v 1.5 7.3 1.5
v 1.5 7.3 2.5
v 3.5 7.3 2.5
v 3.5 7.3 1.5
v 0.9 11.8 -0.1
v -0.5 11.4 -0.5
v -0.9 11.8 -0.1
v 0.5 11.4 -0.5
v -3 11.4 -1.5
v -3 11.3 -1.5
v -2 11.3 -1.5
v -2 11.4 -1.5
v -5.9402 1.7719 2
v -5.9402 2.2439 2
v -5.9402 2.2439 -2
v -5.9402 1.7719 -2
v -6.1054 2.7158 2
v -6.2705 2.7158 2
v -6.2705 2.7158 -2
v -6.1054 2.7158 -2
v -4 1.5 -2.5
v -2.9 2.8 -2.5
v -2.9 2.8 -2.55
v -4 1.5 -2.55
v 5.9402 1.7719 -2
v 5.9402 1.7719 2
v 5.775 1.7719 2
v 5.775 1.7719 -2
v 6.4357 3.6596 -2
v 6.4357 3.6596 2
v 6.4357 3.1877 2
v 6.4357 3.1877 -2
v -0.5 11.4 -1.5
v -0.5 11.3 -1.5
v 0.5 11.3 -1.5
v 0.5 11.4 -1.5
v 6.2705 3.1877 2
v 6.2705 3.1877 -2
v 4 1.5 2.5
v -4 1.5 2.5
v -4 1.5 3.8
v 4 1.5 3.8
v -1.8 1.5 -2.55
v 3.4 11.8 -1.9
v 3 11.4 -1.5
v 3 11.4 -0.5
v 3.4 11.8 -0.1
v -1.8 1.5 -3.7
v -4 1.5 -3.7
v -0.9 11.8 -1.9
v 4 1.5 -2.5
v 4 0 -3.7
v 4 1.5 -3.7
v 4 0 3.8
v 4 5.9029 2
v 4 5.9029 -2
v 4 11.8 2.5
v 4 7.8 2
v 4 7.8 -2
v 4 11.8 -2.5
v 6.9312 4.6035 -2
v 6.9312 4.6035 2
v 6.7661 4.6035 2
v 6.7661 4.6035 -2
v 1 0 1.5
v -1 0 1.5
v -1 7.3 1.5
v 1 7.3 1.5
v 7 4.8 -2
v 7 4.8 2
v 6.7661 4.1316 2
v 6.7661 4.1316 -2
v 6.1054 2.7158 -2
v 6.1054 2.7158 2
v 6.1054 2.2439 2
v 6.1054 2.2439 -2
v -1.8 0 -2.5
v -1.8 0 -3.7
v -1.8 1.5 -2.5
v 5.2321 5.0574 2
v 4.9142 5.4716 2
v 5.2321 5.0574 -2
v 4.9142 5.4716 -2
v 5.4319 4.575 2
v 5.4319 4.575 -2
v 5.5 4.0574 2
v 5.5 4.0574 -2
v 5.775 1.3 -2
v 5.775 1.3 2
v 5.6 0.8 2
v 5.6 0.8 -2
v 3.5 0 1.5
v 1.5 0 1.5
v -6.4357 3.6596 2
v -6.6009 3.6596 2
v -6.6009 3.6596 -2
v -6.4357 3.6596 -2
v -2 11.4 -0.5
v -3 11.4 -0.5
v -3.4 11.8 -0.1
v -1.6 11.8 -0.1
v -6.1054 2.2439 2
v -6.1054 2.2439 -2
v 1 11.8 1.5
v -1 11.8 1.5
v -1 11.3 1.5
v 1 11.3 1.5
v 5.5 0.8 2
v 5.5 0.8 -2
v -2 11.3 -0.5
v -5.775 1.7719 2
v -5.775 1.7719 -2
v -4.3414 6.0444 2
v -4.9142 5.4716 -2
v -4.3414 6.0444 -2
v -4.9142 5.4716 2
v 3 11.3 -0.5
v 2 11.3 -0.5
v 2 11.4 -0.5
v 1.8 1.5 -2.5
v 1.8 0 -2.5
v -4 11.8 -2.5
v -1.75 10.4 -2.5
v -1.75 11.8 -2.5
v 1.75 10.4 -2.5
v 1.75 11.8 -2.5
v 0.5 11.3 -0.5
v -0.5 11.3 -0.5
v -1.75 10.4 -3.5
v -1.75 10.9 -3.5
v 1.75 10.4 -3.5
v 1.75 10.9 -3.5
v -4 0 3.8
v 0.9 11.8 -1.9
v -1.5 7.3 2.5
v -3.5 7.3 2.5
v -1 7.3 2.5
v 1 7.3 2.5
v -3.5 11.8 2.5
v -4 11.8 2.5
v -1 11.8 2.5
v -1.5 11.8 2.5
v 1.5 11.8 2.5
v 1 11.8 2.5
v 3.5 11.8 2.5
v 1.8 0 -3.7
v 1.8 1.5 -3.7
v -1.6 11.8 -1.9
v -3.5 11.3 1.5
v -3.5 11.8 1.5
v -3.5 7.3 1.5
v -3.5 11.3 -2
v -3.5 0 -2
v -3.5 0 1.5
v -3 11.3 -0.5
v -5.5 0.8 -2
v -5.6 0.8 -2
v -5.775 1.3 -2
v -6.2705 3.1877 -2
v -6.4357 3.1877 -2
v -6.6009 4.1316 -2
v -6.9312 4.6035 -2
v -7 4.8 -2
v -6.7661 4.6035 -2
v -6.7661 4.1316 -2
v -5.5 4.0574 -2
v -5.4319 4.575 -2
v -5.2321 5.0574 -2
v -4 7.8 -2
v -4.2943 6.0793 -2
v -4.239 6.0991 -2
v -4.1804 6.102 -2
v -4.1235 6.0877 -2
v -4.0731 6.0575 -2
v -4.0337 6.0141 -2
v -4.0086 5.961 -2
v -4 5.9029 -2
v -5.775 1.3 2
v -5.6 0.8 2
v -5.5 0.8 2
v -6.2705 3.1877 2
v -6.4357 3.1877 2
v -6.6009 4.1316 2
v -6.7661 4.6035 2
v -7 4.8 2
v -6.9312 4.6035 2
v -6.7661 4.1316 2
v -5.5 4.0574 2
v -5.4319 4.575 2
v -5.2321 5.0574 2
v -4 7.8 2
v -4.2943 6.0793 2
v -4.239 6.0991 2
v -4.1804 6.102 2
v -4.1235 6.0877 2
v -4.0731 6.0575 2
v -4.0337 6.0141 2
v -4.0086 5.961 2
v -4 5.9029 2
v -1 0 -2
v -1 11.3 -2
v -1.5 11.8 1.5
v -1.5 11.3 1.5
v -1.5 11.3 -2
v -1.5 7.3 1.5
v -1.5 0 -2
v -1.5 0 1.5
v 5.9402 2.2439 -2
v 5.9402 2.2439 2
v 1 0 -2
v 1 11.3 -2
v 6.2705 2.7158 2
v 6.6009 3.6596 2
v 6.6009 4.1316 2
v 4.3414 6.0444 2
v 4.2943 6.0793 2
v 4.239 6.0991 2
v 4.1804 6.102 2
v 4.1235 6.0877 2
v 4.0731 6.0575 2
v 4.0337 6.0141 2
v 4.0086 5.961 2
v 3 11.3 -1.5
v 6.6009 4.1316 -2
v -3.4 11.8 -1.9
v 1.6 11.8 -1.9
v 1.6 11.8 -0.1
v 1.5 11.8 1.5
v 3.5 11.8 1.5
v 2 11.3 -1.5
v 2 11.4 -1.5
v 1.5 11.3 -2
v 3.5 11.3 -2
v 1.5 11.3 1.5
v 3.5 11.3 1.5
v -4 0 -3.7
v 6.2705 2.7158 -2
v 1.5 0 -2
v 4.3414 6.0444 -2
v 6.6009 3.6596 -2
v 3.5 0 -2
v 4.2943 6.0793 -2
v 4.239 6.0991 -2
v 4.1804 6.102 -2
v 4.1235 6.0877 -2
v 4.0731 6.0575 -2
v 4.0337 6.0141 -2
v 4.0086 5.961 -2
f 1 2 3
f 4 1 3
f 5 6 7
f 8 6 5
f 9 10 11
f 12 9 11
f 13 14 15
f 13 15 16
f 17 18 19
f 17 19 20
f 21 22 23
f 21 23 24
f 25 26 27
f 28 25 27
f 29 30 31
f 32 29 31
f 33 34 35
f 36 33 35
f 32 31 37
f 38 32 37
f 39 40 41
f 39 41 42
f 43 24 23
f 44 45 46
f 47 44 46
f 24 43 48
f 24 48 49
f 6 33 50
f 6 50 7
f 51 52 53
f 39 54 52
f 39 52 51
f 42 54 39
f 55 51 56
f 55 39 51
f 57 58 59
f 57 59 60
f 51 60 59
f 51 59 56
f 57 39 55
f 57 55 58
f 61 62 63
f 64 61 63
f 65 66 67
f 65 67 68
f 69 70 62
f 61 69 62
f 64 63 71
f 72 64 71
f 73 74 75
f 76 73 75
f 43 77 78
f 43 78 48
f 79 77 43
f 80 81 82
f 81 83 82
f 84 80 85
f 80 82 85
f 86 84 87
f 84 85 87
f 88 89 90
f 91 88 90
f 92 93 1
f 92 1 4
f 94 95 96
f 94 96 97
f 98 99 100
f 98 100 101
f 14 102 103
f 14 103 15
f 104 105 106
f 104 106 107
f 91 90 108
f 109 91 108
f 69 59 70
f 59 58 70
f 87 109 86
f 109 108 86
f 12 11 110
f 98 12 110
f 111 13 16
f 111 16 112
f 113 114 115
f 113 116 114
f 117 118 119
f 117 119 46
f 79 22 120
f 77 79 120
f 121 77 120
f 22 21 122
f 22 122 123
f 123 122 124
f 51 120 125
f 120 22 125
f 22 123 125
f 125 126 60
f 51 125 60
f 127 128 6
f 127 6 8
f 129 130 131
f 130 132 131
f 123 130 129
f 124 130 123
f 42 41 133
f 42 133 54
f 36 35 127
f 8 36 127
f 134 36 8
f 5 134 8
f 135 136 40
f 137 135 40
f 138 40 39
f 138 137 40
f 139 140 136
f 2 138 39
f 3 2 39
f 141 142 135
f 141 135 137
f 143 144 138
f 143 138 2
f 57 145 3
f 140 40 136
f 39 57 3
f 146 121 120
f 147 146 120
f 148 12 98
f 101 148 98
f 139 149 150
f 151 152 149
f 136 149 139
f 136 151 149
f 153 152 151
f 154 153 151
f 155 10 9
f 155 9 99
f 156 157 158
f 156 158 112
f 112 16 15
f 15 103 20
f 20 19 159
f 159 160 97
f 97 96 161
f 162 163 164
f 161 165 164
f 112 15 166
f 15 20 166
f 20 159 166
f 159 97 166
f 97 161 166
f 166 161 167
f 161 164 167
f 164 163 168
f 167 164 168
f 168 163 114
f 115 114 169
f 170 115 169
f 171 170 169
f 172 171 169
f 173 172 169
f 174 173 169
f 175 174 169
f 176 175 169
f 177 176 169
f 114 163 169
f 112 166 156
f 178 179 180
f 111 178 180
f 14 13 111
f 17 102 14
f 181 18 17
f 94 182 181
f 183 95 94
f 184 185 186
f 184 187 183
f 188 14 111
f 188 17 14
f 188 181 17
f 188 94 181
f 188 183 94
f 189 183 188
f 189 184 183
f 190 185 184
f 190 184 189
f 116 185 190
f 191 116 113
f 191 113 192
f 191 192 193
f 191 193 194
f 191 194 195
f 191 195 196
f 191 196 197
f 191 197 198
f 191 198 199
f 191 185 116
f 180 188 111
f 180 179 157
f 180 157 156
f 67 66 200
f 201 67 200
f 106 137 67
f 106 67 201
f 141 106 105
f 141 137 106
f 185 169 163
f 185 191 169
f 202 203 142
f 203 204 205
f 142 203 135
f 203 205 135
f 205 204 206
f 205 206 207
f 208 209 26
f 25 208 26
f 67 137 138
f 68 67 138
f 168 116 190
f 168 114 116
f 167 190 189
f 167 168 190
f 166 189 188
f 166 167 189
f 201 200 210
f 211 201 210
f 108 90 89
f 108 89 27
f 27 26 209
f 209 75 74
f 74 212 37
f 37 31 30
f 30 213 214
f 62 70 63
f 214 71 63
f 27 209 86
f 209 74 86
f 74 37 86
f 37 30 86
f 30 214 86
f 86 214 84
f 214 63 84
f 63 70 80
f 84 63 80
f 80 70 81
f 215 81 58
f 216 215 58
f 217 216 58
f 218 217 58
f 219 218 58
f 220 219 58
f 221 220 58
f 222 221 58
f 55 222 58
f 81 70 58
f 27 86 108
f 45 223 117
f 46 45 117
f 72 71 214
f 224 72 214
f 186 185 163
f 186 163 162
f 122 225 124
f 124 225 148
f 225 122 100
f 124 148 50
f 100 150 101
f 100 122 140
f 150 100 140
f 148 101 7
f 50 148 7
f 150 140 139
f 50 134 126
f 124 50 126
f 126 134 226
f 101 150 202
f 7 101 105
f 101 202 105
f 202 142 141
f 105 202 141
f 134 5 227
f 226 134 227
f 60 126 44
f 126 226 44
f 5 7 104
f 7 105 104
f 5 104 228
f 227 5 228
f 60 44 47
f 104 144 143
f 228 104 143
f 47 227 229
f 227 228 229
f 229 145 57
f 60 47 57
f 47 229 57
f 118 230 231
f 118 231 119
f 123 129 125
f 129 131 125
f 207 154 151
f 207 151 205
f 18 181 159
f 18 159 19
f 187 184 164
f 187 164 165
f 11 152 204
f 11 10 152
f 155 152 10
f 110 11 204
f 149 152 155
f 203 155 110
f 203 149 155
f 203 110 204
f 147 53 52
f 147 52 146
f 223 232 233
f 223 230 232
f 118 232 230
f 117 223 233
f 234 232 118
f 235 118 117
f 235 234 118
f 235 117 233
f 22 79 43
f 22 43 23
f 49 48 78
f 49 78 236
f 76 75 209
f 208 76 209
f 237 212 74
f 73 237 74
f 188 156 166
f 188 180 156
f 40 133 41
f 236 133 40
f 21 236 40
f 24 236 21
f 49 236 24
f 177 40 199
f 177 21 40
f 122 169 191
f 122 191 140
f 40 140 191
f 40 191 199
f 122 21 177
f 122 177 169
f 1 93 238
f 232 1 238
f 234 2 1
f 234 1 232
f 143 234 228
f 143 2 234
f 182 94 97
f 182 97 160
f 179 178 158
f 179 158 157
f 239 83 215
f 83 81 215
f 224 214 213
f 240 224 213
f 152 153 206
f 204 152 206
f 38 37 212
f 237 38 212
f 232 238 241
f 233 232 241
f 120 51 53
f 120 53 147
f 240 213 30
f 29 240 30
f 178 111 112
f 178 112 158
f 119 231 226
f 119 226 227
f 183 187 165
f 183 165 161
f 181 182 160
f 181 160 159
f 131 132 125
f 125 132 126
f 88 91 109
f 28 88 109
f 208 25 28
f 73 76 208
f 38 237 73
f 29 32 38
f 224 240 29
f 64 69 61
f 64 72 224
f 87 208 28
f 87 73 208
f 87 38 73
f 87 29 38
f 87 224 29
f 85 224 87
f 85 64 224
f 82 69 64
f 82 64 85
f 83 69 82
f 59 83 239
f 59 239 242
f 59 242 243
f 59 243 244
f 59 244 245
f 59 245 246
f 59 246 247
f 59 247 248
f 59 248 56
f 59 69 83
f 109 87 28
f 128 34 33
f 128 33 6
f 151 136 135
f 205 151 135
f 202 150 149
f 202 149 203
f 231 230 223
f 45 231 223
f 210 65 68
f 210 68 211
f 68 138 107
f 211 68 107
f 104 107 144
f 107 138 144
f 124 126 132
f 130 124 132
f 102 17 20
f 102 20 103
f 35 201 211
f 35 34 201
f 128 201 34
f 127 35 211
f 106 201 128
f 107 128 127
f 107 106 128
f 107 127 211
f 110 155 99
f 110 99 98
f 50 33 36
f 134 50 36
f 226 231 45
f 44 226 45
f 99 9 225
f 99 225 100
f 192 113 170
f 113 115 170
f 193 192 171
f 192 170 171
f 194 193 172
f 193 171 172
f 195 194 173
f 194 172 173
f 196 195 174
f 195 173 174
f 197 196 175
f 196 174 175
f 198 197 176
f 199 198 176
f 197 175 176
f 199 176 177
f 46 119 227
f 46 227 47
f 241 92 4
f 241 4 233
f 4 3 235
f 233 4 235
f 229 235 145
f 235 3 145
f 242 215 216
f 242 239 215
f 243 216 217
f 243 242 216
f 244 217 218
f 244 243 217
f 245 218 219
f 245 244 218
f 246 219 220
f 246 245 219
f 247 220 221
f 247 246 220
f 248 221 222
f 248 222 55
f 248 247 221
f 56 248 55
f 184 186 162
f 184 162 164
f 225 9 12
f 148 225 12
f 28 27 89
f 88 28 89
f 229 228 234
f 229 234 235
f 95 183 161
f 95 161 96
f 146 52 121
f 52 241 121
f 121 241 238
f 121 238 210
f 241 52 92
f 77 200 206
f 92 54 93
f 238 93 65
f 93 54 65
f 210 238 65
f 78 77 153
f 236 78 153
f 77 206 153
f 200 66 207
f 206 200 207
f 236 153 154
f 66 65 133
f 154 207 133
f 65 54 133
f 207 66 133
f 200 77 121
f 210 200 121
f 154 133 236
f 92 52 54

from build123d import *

# Parameters (mm, degrees)
SKIZZE1_W                       = 8
SKIZZE1_H                       = 11.8
AUFSATZ_LINEAR_AUSTRAGEN1_DEPTH = 2.5
SKIZZE2_W                       = 8
SKIZZE2_H                       = 1.5
AUFSATZ_LINEAR_AUSTRAGEN2_DEPTH = 1.3
SKIZZE3_W                       = 2.2
SKIZZE3_H                       = 1.5
AUFSATZ_LINEAR_AUSTRAGEN3_DEPTH = 1.2
AUFSATZ_LINEAR_AUSTRAGEN4_DEPTH = 1.75
AUFSATZ_LINEAR_AUSTRAGEN5_DEPTH = 0.05
SKIZZE6_W                       = 2
SKIZZE6_H                       = 3.5
SCHNITT_LINEAR_AUSTRAGEN1_DEPTH = 11.3
SKIZZE7_W                       = 2
SKIZZE7_H                       = 4.5
SCHNITT_LINEAR_AUSTRAGEN2_DEPTH = 1
SKIZZE8_W                       = 1
SKIZZE8_H                       = 1
SCHNITT_LINEAR_AUSTRAGEN3_DEPTH = 13.574975149
FASE1_SIZE                      = 0.4
LINEARES_MUSTER1_COUNT          = 3
LINEARES_MUSTER1_PITCH          = 2.5
FASE1_OF_LINEARES_MUSTER1_SIZE  = 0.4
AUFSATZ_LINEAR_AUSTRAGEN6_DEPTH = 2
SCHNITT_LINEAR_AUSTRAGEN4_DEPTH = 2.5
LINEARES_MUSTER2_COUNT          = 7
LINEARES_MUSTER2_PITCH          = 0.5
VERRUNDUNG1_R                   = 2
VERRUNDUNG2_R                   = 0.2
SPIEGELN1_COPY_1_DEPTH          = 2.5
SPIEGELN1_COPY_2_DEPTH          = 2.5
SPIEGELN1_COPY_3_DEPTH          = 2.5
SPIEGELN1_COPY_4_DEPTH          = 2.5
SPIEGELN1_COPY_5_DEPTH          = 2.5
SPIEGELN1_COPY_6_DEPTH          = 2.5
VERRUNDUNG1_OF_SPIEGELN1_R      = 2
VERRUNDUNG2_OF_SPIEGELN1_R      = 0.2


with BuildPart() as part:
    # Skizze1 → Aufsatz-Linear austragen1 (new, symmetric)
    with BuildSketch(Plane.XY):
        with Locations((0, 5.9)):
            Rectangle(SKIZZE1_W, SKIZZE1_H)
    extrude(amount=AUFSATZ_LINEAR_AUSTRAGEN1_DEPTH, both=True)

    # Skizze2 → Aufsatz-Linear austragen2 (add)
    with BuildSketch(Plane.XY.offset(2.5)):
        with Locations((0, 0.75)):
            Rectangle(SKIZZE2_W, SKIZZE2_H)
    extrude(amount=AUFSATZ_LINEAR_AUSTRAGEN2_DEPTH)

    # Skizze3 → Aufsatz-Linear austragen3 (add)
    with BuildSketch(Plane(origin=(0, 0, -2.5), x_dir=(-1, 0, 0), z_dir=(0, 0, -1))):
        with Locations((-2.9, 0.75)):
            Rectangle(SKIZZE3_W, SKIZZE3_H)
        with Locations((2.9, 0.75)):
            Rectangle(SKIZZE3_W, SKIZZE3_H)
    extrude(amount=AUFSATZ_LINEAR_AUSTRAGEN3_DEPTH)

    # Skizze4 → Aufsatz-Linear austragen4 (add, symmetric)
    with BuildSketch(Plane(origin=(0, 0, 0), x_dir=(0, 0, -1), z_dir=(1, 0, 0))):
        Polygon((2.5, 11.8), (3.5, 10.9), (3.5, 10.4), (2.5, 10.4), align=None)
    extrude(amount=AUFSATZ_LINEAR_AUSTRAGEN4_DEPTH, both=True)

    # Skizze5 → Aufsatz-Linear austragen5 (add)
    with BuildSketch(Plane(origin=(0, 0, -2.5), x_dir=(-1, 0, 0), z_dir=(0, 0, -1))):
        Polygon((1.8, 1.5), (2.9, 2.8), (4, 1.5), align=None)
    extrude(amount=AUFSATZ_LINEAR_AUSTRAGEN5_DEPTH)

    # Skizze6 → Schnitt-Linear austragen1 (cut)
    with BuildSketch(Plane.XZ):
        with Locations((-2.5, -0.25)):
            Rectangle(SKIZZE6_W, SKIZZE6_H)
    schnitt_linear_austragen1 = extrude(amount=-SCHNITT_LINEAR_AUSTRAGEN1_DEPTH, mode=Mode.SUBTRACT)

    # Skizze7 → Schnitt-Linear austragen2 (cut)
    with BuildSketch(Plane.XY.offset(2.5)):
        with Locations((-2.5, 9.55)):
            Rectangle(SKIZZE7_W, SKIZZE7_H)
    schnitt_linear_austragen2 = extrude(amount=-SCHNITT_LINEAR_AUSTRAGEN2_DEPTH, mode=Mode.SUBTRACT)

    # Skizze8 → Schnitt-Linear austragen3 (cut, through all)
    with BuildSketch(Plane.XZ.offset(-11.3)):
        with Locations((-2.5, -1)):
            Rectangle(SKIZZE8_W, SKIZZE8_H)
    schnitt_linear_austragen3 = extrude(amount=-SCHNITT_LINEAR_AUSTRAGEN3_DEPTH, mode=Mode.SUBTRACT)

    # Fase1
    fase1_edges = [part.edges().sort_by_distance(p)[0] for p in [
        (-3, 11.8, -1),
        (-2.5, 11.8, -0.5),
        (-2, 11.8, -1),
        (-2.5, 11.8, -1.5),
    ]]
    chamfer(fase1_edges, length=FASE1_SIZE)

    # Lineares Muster1: Schnitt-Linear austragen1, Schnitt-Linear austragen2, Schnitt-Linear austragen3 ×3
    with Locations(*[(i * LINEARES_MUSTER1_PITCH, 0, 0) for i in range(1, LINEARES_MUSTER1_COUNT)]):
        add(schnitt_linear_austragen1, mode=Mode.SUBTRACT)
        add(schnitt_linear_austragen2, mode=Mode.SUBTRACT)
        add(schnitt_linear_austragen3, mode=Mode.SUBTRACT)

    # Fase1 of Lineares Muster1
    fase1_of_lineares_muster1_edges = [part.edges().sort_by_distance(p)[0] for p in [
        (-0.5, 11.8, -1),
        (0, 11.8, -0.5),
        (0.5, 11.8, -1),
        (0, 11.8, -1.5),
        (2, 11.8, -1),
        (2.5, 11.8, -0.5),
        (3, 11.8, -1),
        (2.5, 11.8, -1.5),
    ]]
    chamfer(fase1_of_lineares_muster1_edges, length=FASE1_OF_LINEARES_MUSTER1_SIZE)

    # Skizze9 → Aufsatz-Linear austragen6 (add, symmetric)
    with BuildSketch(Plane.XY):
        Polygon((-4, 7.8), (-7, 4.8), (-5.6, 0.8), (-5.5, 0.8), (-5.5, 4.885786438), (-4, 6.385786438), align=None)
    aufsatz_linear_austragen6 = extrude(amount=AUFSATZ_LINEAR_AUSTRAGEN6_DEPTH, both=True)

    # Skizze11 → Schnitt-Linear austragen4 (cut, symmetric)
    with BuildSketch(Plane.XY):
        Polygon((-5.940175212, 1.771929178), (-5.775, 1.771929178), (-5.775, 1.3), align=None)
    schnitt_linear_austragen4 = extrude(amount=SCHNITT_LINEAR_AUSTRAGEN4_DEPTH, both=True, mode=Mode.SUBTRACT)

    # Lineares Muster2: Schnitt-Linear austragen4 ×7
    with Locations(*[Vector(-0.33035042472810877, 0.9438583563660166, 0) * (i * LINEARES_MUSTER2_PITCH) for i in range(1, LINEARES_MUSTER2_COUNT)]):
        add(schnitt_linear_austragen4, mode=Mode.SUBTRACT)

    # Verrundung1
    verrundung1_edges = [part.edges().sort_by_distance(p)[0] for p in [
        (-5.5, 4.885786438, 0),
    ]]
    fillet(verrundung1_edges, radius=VERRUNDUNG1_R)

    # Verrundung2
    verrundung2_edges = [part.edges().sort_by_distance(p)[0] for p in [
        (-4, 6.385786438, 0),
    ]]
    fillet(verrundung2_edges, radius=VERRUNDUNG2_R)

    # Spiegeln1: Aufsatz-Linear austragen6, Schnitt-Linear austragen4 across plane
    add(aufsatz_linear_austragen6.mirror(Plane(origin=(0, 0, 0), x_dir=(0, 0, 1), z_dir=(1, 0, 0))))
    add(schnitt_linear_austragen4.mirror(Plane(origin=(0, 0, 0), x_dir=(0, 0, 1), z_dir=(1, 0, 0))), mode=Mode.SUBTRACT)

    # Spiegeln1 copy 1 sketch → Spiegeln1 copy 1 (cut, symmetric)
    with BuildSketch(Plane(origin=(0.165175212, 0.471929178, 0), x_dir=(-1, 0, 0), z_dir=(0, 0, 1))):
        Polygon((-5.940175212, -1.771929178), (-5.775, -1.771929178), (-5.775, -1.3), align=None)
    extrude(amount=SPIEGELN1_COPY_1_DEPTH, both=True, mode=Mode.SUBTRACT)

    # Spiegeln1 copy 2 sketch → Spiegeln1 copy 2 (cut, symmetric)
    with BuildSketch(Plane(origin=(0.33035042472810877, 0.9438583563660166, 0), x_dir=(-1, 0, 0), z_dir=(0, 0, 1))):
        Polygon((-5.940175212, -1.771929178), (-5.775, -1.771929178), (-5.775, -1.3), align=None)
    extrude(amount=SPIEGELN1_COPY_2_DEPTH, both=True, mode=Mode.SUBTRACT)

    # Spiegeln1 copy 3 sketch → Spiegeln1 copy 3 (cut, symmetric)
    with BuildSketch(Plane(origin=(0.495525637, 1.415787535, 0), x_dir=(-1, 0, 0), z_dir=(0, 0, 1))):
        Polygon((-5.940175212, -1.771929178), (-5.775, -1.771929178), (-5.775, -1.3), align=None)
    extrude(amount=SPIEGELN1_COPY_3_DEPTH, both=True, mode=Mode.SUBTRACT)

    # Spiegeln1 copy 4 sketch → Spiegeln1 copy 4 (cut, symmetric)
    with BuildSketch(Plane(origin=(0.660700849, 1.887716713, 0), x_dir=(-1, 0, 0), z_dir=(0, 0, 1))):
        Polygon((-5.940175212, -1.771929178), (-5.775, -1.771929178), (-5.775, -1.3), align=None)
    extrude(amount=SPIEGELN1_COPY_4_DEPTH, both=True, mode=Mode.SUBTRACT)

    # Spiegeln1 copy 5 sketch → Spiegeln1 copy 5 (cut, symmetric)
    with BuildSketch(Plane(origin=(0.825876062, 2.359645891, 0), x_dir=(-1, 0, 0), z_dir=(0, 0, 1))):
        Polygon((-5.940175212, -1.771929178), (-5.775, -1.771929178), (-5.775, -1.3), align=None)
    extrude(amount=SPIEGELN1_COPY_5_DEPTH, both=True, mode=Mode.SUBTRACT)

    # Spiegeln1 copy 6 sketch → Spiegeln1 copy 6 (cut, symmetric)
    with BuildSketch(Plane(origin=(0.991051274, 2.831575069, 0), x_dir=(-1, 0, 0), z_dir=(0, 0, 1))):
        Polygon((-5.940175212, -1.771929178), (-5.775, -1.771929178), (-5.775, -1.3), align=None)
    extrude(amount=SPIEGELN1_COPY_6_DEPTH, both=True, mode=Mode.SUBTRACT)

    # Verrundung1 of Spiegeln1
    verrundung1_of_spiegeln1_edges = [part.edges().sort_by_distance(p)[0] for p in [
        (5.5, 4.885786438, 0),
    ]]
    fillet(verrundung1_of_spiegeln1_edges, radius=VERRUNDUNG1_OF_SPIEGELN1_R)

    # Verrundung2 of Spiegeln1
    verrundung2_of_spiegeln1_edges = [part.edges().sort_by_distance(p)[0] for p in [
        (4, 6.385786438, 0),
    ]]
    fillet(verrundung2_of_spiegeln1_edges, radius=VERRUNDUNG2_OF_SPIEGELN1_R)


solid = part.part
